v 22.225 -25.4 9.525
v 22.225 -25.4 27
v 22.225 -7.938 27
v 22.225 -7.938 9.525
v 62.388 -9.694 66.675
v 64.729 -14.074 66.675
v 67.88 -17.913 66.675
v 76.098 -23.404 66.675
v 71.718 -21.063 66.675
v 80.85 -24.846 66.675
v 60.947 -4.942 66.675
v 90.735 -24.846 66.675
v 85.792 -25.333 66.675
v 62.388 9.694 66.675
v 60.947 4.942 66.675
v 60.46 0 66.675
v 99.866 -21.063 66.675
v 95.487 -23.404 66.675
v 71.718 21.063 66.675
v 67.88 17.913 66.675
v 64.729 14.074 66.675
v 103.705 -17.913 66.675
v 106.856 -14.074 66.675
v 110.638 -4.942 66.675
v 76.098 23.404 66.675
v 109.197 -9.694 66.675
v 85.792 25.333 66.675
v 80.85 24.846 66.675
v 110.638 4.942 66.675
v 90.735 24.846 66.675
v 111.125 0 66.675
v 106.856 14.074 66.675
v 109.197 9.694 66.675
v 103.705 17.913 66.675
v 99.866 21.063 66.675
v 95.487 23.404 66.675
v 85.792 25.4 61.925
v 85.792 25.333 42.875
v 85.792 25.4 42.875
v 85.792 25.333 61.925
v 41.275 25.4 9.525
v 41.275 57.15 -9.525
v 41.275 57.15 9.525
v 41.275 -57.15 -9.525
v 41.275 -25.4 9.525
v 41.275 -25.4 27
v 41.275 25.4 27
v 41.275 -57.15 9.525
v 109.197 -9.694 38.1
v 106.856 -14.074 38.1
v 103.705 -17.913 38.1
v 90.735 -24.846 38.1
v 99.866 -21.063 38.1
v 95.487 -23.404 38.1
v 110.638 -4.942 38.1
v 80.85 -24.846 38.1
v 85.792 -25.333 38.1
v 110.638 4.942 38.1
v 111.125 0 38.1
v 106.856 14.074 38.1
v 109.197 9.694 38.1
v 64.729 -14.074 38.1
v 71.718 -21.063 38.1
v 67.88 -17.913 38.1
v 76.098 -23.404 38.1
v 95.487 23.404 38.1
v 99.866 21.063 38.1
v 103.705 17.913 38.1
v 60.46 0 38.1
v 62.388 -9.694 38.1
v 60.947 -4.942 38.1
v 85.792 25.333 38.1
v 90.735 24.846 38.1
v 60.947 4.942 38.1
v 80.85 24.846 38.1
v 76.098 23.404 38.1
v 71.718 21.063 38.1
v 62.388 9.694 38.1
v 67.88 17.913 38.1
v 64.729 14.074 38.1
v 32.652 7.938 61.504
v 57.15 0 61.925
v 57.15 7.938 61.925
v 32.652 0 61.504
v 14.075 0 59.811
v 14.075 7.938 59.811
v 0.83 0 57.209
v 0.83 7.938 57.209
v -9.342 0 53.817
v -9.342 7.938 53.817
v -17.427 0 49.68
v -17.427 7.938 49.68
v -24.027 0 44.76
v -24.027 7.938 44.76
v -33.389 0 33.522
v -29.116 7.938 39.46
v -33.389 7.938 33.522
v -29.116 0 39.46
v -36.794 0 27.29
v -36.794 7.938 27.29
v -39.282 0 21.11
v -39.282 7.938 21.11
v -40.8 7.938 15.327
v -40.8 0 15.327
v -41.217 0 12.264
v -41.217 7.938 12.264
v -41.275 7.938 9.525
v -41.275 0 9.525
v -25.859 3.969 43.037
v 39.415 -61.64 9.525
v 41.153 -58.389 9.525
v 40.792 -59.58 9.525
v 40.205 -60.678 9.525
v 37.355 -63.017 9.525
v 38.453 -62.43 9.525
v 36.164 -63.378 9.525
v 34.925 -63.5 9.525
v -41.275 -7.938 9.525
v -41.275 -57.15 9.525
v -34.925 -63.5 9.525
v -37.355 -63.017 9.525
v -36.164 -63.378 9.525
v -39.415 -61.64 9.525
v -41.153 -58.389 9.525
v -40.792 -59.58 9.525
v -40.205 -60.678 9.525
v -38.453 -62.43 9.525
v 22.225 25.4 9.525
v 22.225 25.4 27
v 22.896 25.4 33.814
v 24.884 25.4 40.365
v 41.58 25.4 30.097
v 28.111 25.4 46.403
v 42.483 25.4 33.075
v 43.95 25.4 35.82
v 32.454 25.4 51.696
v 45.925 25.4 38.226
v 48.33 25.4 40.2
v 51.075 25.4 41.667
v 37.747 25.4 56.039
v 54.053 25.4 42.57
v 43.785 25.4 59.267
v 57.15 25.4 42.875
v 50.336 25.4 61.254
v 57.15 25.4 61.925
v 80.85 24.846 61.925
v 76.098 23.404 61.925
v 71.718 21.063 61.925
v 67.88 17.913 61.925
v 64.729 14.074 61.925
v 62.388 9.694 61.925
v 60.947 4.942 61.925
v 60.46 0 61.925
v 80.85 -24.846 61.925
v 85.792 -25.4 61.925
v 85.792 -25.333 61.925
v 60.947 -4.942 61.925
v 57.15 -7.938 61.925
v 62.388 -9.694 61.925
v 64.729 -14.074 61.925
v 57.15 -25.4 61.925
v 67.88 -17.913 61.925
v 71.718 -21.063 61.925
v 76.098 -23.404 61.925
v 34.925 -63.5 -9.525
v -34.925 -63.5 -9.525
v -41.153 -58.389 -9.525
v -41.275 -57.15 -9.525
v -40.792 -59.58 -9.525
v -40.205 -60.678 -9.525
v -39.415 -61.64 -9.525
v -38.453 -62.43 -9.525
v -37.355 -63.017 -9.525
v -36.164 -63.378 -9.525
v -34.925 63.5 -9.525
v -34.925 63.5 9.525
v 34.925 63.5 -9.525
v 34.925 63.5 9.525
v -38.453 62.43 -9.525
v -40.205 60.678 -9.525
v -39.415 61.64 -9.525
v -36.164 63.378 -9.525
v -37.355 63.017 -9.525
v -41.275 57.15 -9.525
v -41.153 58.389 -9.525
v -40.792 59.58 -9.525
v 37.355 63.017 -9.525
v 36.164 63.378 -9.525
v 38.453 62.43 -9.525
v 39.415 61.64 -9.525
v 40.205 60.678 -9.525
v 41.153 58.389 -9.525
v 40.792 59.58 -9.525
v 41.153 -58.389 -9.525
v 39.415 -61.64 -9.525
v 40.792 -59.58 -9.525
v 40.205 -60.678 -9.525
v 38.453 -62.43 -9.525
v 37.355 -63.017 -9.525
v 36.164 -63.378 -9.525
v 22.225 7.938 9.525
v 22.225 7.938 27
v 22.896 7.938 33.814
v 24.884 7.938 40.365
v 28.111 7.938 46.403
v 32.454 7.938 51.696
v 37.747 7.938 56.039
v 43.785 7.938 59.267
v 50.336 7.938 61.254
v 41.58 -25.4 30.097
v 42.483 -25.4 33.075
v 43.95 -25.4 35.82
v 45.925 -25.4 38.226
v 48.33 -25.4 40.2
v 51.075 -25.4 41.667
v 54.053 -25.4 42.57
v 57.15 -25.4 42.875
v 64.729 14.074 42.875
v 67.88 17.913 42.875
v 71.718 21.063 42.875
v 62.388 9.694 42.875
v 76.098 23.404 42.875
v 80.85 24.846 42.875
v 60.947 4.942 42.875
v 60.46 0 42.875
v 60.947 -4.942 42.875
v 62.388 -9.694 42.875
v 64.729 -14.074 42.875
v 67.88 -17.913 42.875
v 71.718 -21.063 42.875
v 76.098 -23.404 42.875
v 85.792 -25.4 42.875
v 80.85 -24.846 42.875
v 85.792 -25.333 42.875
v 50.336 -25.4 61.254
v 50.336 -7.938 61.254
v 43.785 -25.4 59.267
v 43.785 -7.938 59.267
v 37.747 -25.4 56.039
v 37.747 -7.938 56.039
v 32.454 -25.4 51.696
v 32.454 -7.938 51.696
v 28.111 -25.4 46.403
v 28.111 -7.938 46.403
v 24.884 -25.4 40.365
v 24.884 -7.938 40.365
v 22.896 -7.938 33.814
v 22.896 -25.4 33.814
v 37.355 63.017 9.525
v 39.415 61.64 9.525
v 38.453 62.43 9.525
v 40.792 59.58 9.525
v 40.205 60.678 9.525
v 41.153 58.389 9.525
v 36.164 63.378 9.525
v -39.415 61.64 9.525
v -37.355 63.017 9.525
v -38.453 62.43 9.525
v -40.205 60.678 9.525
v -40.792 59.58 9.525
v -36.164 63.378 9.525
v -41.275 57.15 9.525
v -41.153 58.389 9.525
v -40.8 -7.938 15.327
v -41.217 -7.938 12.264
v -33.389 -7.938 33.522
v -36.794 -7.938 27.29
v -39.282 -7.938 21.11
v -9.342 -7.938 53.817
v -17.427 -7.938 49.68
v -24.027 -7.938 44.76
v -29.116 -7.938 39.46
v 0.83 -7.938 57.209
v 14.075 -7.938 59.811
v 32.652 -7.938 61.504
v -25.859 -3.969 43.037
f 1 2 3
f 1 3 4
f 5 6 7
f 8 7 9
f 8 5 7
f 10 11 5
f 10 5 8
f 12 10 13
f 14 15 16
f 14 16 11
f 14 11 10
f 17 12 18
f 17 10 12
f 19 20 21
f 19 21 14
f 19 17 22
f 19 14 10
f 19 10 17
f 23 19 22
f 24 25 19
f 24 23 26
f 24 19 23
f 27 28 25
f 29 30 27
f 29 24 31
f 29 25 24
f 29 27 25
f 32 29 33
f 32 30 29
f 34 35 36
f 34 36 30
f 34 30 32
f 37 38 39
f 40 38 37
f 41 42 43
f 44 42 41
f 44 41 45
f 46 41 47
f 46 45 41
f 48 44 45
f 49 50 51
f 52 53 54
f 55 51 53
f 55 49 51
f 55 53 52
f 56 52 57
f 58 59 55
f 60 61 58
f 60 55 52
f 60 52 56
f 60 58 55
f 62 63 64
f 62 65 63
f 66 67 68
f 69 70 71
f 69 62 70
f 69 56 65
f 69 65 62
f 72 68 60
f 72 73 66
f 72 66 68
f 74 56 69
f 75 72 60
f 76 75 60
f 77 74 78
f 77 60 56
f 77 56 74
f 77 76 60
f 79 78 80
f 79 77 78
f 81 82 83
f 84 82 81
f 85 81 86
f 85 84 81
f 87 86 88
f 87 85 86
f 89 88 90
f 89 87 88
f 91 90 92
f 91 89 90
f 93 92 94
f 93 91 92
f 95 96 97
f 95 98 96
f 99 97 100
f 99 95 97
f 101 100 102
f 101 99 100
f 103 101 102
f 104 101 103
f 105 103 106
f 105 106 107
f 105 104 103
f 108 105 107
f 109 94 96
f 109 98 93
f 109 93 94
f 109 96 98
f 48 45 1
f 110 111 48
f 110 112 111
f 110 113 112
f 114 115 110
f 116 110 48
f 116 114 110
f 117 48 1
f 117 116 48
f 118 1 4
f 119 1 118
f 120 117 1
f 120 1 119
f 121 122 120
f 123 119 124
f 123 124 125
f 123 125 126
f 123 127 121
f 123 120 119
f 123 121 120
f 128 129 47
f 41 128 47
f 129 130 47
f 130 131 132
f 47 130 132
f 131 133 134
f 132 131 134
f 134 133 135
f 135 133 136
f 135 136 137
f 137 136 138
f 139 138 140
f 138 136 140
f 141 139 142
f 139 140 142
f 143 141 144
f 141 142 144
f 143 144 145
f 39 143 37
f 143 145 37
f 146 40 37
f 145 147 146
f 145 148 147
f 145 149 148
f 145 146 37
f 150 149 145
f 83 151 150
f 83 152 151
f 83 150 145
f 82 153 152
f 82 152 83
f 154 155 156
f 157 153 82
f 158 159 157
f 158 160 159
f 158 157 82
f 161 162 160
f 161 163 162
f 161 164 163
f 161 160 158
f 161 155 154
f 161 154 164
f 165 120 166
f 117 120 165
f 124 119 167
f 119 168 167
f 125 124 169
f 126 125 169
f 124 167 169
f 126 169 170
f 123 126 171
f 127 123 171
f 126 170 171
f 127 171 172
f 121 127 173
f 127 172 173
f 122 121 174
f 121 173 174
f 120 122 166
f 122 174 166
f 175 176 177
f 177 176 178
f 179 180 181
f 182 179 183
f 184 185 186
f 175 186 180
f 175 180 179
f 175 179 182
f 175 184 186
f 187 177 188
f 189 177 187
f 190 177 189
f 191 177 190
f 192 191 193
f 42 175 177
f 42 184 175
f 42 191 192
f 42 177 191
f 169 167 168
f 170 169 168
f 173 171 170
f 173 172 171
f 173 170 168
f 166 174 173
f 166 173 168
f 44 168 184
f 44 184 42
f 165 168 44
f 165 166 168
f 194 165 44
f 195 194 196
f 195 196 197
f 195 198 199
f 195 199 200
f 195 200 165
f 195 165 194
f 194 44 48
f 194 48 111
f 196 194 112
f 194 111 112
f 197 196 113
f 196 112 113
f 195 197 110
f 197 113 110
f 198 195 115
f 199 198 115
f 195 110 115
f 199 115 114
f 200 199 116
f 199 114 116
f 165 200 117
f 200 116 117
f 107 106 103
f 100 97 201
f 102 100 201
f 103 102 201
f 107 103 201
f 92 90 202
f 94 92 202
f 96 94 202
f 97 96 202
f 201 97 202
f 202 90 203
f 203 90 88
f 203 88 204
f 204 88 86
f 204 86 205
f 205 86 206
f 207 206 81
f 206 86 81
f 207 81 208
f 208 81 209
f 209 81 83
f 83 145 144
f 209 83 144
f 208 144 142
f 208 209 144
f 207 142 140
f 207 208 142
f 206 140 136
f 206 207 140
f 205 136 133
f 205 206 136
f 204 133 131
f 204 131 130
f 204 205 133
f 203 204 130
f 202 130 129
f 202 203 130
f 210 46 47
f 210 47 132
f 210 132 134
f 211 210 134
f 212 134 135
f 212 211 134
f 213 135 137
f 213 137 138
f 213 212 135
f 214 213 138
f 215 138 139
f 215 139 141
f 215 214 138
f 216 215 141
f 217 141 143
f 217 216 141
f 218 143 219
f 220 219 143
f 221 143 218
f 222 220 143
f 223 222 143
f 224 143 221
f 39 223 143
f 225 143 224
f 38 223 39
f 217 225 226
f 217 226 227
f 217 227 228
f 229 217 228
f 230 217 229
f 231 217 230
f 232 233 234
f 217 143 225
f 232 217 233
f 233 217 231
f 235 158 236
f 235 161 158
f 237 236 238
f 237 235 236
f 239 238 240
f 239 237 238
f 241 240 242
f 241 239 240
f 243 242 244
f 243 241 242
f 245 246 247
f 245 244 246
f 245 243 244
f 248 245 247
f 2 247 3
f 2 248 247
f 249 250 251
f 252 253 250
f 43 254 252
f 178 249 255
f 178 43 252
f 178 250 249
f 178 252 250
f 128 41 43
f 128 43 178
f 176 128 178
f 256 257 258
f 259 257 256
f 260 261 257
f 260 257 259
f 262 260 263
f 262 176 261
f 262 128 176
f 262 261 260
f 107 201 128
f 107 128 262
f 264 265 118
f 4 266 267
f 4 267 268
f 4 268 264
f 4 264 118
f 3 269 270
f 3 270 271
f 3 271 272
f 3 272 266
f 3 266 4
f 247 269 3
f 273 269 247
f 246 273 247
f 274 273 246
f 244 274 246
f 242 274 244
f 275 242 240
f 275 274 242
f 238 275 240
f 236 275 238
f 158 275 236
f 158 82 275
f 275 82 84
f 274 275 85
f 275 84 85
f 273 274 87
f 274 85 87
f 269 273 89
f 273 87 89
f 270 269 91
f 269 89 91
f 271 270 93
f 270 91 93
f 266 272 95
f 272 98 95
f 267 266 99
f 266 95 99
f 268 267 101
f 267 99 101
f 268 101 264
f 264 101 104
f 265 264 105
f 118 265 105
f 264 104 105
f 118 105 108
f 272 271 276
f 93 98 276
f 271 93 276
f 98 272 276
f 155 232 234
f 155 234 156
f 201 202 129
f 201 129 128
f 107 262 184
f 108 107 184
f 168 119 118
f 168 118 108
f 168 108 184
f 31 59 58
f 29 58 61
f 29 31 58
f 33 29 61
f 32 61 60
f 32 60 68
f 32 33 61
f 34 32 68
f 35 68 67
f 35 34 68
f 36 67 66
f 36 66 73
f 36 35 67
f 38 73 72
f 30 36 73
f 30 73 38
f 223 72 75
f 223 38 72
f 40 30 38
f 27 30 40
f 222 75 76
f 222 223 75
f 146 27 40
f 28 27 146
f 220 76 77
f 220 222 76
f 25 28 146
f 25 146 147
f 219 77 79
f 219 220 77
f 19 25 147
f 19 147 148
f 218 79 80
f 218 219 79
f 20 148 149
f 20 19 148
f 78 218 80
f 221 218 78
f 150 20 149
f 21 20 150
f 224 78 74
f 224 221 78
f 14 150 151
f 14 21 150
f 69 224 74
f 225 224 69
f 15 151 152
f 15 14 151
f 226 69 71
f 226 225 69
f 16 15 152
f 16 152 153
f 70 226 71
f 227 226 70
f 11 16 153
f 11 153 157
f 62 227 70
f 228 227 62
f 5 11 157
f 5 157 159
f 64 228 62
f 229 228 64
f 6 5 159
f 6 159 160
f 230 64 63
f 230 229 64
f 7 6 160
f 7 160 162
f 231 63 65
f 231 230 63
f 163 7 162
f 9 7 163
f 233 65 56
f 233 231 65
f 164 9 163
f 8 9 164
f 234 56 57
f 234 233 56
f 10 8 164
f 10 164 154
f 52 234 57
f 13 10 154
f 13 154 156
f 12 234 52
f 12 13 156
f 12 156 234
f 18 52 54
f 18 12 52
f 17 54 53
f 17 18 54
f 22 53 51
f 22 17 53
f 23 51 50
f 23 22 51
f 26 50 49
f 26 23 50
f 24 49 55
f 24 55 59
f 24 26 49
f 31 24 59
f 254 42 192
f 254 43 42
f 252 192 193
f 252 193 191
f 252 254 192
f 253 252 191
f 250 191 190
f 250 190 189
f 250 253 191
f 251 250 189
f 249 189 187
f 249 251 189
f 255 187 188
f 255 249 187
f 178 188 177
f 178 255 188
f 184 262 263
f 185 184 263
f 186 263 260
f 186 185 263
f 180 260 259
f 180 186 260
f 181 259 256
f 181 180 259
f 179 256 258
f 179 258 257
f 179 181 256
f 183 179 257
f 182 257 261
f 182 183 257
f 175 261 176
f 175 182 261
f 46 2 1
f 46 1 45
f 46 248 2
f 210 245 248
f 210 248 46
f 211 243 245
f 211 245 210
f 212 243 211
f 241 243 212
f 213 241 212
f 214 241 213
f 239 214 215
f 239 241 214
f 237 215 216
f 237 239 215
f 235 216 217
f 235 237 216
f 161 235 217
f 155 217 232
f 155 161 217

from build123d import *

# Parameters (mm, degrees)
F1_DEPTH = 63.5
F0_W     = 25.4674297452
F0_H     = 19.05
F2_DEPTH = 25.4
F3_DEPTH = 7.9375
F5_R     = 6.35


with BuildPart() as f1:
    # F0 (on Front) → F1 (new body, symmetric)
    with BuildSketch(Plane.XZ):
        Polygon((22.225, 9.525), (-41.275, 9.525), (-41.275, -9.525), (41.275, -9.525), (41.275, 9.525), align=None)
    extrude(amount=F1_DEPTH, both=True)

    # F0 (on Front) → F2 (join, symmetric)
    with BuildSketch(Plane.XZ):
        with BuildLine():
            Line((22.225, 27.0002), (22.225, 9.525))
            Line((22.225, 9.525), (41.275, 9.525))
            Line((41.275, 9.525), (41.275, 27.0002))
            ThreePointArc((41.275, 27.0002), (45.9246798487, 38.2255201513), (57.15, 42.8752))
            Line((57.15, 42.8752), (60.325, 42.8752))
            Line((60.325, 42.8752), (60.325, 61.9252))
            Line((60.325, 61.9252), (57.15, 61.9252))
            ThreePointArc((57.15, 61.9252), (32.4542956671, 51.6959043329), (22.225, 27.0002))
        make_face()
        with Locations((73.0587148726, 52.4002)):
            Rectangle(F0_W, F0_H)
    extrude(amount=F2_DEPTH, both=True)

    # F0 (on Front) → F3 (join, symmetric)
    with BuildSketch(Plane.XZ):
        with BuildLine():
            add(Edge.make_bspline(
                [(57.15, 61.9252), (15.1281916878, 62.2740810515), (-27.3216856892, 55.7221643058), (-41.6932850244, 18.0006596408), (-41.275, 9.525)],
                knots=[0, 0, 0, 0, 0.6030423214, 1, 1, 1, 1], degree=3))
            Line((-41.275, 9.525), (22.225, 9.525))
            Line((22.225, 9.525), (22.225, 27.0002))
            ThreePointArc((22.225, 27.0002), (32.4542956671, 51.6959043329), (57.15, 61.9252))
        make_face()
    extrude(amount=F3_DEPTH, both=True)

    # F0 (on Front) → F4 (revolve)
    with BuildSketch(Plane.XZ):
        Polygon((85.7924297452, 66.675), (85.7924297452, 61.9252), (85.7924297452, 42.8752), (85.7924297452, 38.1), (111.125, 38.1), (111.125, 66.675), align=None)
    revolve(axis=Axis((85.7924297452, 0, 52.3875), (0, 0, 1)))

    # F5
    f5_edges = [f1.edges().sort_by_distance(p)[0] for p in [
        (-41.275, -63.5, 0),
        (41.275, -63.5, 0),
        (41.275, 63.5, 0),
        (-41.275, 63.5, 0),
    ]]
    fillet(f5_edges, radius=F5_R)


solid = f1.part
